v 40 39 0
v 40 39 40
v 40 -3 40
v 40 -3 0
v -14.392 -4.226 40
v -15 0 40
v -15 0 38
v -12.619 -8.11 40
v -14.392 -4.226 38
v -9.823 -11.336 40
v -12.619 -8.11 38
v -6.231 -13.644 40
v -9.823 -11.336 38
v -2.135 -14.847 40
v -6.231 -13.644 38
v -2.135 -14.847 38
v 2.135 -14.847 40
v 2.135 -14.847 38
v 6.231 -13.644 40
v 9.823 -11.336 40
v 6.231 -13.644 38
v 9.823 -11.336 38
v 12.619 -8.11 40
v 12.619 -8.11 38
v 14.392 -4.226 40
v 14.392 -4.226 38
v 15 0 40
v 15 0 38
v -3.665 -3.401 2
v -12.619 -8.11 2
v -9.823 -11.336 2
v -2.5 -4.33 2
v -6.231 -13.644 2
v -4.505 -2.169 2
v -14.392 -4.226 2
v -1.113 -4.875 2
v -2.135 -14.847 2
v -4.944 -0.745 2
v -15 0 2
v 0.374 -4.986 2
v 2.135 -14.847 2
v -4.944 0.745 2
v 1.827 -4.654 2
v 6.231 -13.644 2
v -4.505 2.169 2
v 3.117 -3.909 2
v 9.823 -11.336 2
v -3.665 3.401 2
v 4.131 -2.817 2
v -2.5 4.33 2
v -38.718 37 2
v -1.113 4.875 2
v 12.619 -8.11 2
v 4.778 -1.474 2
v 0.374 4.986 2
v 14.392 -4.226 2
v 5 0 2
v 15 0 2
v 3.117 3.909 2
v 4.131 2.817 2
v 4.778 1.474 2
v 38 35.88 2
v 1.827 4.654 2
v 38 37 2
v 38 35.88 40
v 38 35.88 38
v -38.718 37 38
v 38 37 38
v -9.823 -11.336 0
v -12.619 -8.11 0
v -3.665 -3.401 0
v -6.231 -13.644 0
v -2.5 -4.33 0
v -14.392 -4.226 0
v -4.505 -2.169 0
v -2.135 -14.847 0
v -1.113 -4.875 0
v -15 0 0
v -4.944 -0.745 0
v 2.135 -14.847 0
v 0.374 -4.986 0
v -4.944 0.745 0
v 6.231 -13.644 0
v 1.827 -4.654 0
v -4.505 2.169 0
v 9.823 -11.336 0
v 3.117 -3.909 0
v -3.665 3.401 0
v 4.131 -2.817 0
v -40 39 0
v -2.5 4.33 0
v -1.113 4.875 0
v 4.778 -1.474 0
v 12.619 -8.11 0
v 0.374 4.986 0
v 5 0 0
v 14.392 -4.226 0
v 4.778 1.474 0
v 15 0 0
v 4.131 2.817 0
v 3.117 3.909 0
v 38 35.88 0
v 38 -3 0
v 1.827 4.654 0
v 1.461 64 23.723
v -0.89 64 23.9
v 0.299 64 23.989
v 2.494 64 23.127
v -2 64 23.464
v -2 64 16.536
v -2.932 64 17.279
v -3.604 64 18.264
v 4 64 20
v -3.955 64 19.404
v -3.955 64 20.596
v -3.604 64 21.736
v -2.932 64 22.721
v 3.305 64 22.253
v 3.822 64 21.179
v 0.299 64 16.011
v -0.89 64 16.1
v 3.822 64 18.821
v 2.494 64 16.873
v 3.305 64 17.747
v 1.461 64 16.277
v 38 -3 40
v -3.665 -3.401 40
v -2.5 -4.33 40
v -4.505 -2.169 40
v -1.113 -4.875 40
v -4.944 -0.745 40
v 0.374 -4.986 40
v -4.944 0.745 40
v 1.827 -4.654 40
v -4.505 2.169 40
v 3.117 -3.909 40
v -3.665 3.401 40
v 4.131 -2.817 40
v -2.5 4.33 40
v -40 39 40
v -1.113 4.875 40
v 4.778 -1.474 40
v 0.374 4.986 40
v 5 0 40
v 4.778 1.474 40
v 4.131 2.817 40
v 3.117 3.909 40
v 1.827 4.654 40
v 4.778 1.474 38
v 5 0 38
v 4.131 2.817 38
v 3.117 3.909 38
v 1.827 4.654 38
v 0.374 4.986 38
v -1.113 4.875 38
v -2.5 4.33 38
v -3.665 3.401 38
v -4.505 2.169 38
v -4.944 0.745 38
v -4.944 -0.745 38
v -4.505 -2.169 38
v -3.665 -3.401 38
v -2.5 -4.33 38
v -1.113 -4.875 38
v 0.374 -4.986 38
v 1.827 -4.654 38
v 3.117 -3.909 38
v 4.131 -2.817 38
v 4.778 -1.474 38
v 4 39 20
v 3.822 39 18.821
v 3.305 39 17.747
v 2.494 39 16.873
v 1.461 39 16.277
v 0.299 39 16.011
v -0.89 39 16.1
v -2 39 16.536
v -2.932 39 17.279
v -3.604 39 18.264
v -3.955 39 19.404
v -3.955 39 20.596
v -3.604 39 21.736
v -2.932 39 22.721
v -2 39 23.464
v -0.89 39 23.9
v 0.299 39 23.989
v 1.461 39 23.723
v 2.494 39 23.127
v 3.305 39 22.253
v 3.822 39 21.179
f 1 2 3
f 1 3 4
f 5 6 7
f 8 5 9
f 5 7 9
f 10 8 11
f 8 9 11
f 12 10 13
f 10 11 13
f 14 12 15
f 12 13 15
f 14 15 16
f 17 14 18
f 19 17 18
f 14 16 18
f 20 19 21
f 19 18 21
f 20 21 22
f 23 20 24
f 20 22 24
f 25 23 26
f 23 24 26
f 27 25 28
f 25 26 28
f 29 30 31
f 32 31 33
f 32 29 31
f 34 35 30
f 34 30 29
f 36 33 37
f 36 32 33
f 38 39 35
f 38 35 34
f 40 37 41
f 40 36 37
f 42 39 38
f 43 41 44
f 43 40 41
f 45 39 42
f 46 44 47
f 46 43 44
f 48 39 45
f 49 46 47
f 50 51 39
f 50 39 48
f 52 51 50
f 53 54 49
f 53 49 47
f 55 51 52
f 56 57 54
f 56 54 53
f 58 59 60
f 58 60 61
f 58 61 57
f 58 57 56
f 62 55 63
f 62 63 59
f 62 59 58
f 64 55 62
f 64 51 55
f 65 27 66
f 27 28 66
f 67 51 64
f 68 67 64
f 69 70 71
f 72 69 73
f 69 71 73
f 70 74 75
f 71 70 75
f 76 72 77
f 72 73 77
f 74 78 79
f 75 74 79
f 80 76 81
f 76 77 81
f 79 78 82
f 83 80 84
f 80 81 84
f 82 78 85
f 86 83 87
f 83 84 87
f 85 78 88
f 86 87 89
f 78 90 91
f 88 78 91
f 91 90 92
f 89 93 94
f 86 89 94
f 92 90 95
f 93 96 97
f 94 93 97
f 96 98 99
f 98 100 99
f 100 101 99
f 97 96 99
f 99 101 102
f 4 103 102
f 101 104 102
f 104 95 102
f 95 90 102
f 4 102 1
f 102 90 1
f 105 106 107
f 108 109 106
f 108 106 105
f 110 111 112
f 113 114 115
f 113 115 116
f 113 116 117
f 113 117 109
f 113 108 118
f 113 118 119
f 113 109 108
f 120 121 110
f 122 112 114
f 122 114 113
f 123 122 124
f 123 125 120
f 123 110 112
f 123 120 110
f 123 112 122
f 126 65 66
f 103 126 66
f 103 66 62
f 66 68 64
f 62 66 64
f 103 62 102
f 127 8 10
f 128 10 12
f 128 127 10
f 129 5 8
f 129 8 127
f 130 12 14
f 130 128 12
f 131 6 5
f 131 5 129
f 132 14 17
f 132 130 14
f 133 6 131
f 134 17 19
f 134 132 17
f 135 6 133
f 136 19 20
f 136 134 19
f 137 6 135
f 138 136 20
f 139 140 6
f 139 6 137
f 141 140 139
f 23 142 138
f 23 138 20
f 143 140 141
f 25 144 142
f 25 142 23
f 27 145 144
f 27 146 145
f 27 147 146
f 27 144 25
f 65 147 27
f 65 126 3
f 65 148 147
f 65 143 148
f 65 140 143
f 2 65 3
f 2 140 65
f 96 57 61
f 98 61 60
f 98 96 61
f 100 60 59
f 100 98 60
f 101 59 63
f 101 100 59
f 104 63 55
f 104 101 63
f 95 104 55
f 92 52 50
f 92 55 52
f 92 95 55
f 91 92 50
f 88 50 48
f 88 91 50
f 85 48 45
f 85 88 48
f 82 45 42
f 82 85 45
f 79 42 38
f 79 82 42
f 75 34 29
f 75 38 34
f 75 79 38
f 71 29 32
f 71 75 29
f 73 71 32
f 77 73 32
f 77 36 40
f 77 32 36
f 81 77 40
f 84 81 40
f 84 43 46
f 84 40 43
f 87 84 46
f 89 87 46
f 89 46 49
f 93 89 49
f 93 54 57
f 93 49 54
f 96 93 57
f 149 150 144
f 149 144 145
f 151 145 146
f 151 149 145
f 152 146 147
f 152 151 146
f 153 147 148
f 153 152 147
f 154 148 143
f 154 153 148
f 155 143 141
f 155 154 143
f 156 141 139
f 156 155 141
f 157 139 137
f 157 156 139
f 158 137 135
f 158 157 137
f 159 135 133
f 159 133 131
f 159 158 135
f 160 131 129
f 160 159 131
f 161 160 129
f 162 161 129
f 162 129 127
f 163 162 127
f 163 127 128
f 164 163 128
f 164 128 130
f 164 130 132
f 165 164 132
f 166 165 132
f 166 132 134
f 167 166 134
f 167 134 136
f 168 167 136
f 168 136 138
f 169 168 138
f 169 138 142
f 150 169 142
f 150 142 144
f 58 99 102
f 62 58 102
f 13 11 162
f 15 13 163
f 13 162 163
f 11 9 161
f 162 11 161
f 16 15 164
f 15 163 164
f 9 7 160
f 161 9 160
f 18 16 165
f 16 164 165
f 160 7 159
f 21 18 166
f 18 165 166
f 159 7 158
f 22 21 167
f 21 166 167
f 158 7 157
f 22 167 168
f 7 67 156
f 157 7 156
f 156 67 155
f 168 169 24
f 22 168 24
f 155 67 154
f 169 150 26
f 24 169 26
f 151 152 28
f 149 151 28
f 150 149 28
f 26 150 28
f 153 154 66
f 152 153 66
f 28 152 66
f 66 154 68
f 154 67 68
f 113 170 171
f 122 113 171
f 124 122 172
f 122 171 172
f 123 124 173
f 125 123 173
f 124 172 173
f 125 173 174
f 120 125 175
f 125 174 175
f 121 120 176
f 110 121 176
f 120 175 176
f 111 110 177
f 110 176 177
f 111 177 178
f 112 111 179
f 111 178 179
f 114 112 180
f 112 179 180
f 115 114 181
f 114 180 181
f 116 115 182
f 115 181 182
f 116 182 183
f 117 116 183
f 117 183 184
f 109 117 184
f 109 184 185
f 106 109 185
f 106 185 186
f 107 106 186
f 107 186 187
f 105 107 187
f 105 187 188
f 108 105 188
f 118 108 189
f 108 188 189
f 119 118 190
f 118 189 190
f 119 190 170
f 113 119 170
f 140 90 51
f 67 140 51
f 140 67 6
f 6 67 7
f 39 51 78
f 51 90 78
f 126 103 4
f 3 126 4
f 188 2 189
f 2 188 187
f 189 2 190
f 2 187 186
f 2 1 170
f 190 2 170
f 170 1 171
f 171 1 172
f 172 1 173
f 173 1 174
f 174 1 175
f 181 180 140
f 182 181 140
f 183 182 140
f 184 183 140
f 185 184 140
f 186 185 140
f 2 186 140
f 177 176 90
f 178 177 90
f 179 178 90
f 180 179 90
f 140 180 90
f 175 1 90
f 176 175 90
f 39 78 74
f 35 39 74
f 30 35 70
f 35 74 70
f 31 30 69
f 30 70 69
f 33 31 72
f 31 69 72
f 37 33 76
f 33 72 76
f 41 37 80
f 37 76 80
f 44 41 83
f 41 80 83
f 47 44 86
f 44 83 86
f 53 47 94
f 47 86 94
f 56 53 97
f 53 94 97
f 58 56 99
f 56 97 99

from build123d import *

# Parameters (mm, degrees)
SKETCH_1_R               = 5
EXTRUDE_1_DEPTH          = 40
CUT_EXTRUDE_1_DEPTH      = 18
CUT_EXTRUDE_1_DEPTH_BACK = 18
SKETCH_2_W               = 81.294716022
SKETCH_2_H               = 74
SKETCH_3_R               = 4
EXTRUDE_2_DEPTH          = 25
SKETCH_4_W               = 2
SKETCH_4_H               = 40
EXTRUDE_3_DEPTH          = 42


with BuildPart() as part:
    # 草图1 → 凸台-拉伸1 (new body)
    with BuildSketch(Plane.XY):
        with BuildLine():
            Line((0, 39), (-40, 39))
            Line((-40, 39), (-15, 0))
            ThreePointArc((-15, 0), (0, -15), (15, 0))
            Line((15, 0), (40, 39))
            Line((40, 39), (0, 39))
        make_face()
        Circle(SKETCH_1_R, mode=Mode.SUBTRACT)
    extrude(amount=EXTRUDE_1_DEPTH)

    # 草图2 → 切除-拉伸1 (cut, two sides: drawn at the far end of the back side and taken through both)
    with BuildSketch(Plane.XY.offset(20).offset(-CUT_EXTRUDE_1_DEPTH_BACK)):
        Rectangle(SKETCH_2_W, SKETCH_2_H)
    extrude(amount=CUT_EXTRUDE_1_DEPTH + CUT_EXTRUDE_1_DEPTH_BACK, mode=Mode.SUBTRACT)

    # 草图3 → 凸台-拉伸2 (add)
    with BuildSketch(Plane(origin=(0, 39, 0), x_dir=(1, 0, 0), z_dir=(0, 1, 0))):
        with Locations((0, -20)):
            Circle(SKETCH_3_R)
    extrude(amount=EXTRUDE_2_DEPTH)

    # 草图4 → 凸台-拉伸3 (add)
    with BuildSketch(Plane(origin=(0, 39, 0), x_dir=(1, 0, 0), z_dir=(0, 1, 0))):
        with Locations((39, -20)):
            Rectangle(SKETCH_4_W, SKETCH_4_H)
    extrude(amount=-EXTRUDE_3_DEPTH)


solid = part.part
